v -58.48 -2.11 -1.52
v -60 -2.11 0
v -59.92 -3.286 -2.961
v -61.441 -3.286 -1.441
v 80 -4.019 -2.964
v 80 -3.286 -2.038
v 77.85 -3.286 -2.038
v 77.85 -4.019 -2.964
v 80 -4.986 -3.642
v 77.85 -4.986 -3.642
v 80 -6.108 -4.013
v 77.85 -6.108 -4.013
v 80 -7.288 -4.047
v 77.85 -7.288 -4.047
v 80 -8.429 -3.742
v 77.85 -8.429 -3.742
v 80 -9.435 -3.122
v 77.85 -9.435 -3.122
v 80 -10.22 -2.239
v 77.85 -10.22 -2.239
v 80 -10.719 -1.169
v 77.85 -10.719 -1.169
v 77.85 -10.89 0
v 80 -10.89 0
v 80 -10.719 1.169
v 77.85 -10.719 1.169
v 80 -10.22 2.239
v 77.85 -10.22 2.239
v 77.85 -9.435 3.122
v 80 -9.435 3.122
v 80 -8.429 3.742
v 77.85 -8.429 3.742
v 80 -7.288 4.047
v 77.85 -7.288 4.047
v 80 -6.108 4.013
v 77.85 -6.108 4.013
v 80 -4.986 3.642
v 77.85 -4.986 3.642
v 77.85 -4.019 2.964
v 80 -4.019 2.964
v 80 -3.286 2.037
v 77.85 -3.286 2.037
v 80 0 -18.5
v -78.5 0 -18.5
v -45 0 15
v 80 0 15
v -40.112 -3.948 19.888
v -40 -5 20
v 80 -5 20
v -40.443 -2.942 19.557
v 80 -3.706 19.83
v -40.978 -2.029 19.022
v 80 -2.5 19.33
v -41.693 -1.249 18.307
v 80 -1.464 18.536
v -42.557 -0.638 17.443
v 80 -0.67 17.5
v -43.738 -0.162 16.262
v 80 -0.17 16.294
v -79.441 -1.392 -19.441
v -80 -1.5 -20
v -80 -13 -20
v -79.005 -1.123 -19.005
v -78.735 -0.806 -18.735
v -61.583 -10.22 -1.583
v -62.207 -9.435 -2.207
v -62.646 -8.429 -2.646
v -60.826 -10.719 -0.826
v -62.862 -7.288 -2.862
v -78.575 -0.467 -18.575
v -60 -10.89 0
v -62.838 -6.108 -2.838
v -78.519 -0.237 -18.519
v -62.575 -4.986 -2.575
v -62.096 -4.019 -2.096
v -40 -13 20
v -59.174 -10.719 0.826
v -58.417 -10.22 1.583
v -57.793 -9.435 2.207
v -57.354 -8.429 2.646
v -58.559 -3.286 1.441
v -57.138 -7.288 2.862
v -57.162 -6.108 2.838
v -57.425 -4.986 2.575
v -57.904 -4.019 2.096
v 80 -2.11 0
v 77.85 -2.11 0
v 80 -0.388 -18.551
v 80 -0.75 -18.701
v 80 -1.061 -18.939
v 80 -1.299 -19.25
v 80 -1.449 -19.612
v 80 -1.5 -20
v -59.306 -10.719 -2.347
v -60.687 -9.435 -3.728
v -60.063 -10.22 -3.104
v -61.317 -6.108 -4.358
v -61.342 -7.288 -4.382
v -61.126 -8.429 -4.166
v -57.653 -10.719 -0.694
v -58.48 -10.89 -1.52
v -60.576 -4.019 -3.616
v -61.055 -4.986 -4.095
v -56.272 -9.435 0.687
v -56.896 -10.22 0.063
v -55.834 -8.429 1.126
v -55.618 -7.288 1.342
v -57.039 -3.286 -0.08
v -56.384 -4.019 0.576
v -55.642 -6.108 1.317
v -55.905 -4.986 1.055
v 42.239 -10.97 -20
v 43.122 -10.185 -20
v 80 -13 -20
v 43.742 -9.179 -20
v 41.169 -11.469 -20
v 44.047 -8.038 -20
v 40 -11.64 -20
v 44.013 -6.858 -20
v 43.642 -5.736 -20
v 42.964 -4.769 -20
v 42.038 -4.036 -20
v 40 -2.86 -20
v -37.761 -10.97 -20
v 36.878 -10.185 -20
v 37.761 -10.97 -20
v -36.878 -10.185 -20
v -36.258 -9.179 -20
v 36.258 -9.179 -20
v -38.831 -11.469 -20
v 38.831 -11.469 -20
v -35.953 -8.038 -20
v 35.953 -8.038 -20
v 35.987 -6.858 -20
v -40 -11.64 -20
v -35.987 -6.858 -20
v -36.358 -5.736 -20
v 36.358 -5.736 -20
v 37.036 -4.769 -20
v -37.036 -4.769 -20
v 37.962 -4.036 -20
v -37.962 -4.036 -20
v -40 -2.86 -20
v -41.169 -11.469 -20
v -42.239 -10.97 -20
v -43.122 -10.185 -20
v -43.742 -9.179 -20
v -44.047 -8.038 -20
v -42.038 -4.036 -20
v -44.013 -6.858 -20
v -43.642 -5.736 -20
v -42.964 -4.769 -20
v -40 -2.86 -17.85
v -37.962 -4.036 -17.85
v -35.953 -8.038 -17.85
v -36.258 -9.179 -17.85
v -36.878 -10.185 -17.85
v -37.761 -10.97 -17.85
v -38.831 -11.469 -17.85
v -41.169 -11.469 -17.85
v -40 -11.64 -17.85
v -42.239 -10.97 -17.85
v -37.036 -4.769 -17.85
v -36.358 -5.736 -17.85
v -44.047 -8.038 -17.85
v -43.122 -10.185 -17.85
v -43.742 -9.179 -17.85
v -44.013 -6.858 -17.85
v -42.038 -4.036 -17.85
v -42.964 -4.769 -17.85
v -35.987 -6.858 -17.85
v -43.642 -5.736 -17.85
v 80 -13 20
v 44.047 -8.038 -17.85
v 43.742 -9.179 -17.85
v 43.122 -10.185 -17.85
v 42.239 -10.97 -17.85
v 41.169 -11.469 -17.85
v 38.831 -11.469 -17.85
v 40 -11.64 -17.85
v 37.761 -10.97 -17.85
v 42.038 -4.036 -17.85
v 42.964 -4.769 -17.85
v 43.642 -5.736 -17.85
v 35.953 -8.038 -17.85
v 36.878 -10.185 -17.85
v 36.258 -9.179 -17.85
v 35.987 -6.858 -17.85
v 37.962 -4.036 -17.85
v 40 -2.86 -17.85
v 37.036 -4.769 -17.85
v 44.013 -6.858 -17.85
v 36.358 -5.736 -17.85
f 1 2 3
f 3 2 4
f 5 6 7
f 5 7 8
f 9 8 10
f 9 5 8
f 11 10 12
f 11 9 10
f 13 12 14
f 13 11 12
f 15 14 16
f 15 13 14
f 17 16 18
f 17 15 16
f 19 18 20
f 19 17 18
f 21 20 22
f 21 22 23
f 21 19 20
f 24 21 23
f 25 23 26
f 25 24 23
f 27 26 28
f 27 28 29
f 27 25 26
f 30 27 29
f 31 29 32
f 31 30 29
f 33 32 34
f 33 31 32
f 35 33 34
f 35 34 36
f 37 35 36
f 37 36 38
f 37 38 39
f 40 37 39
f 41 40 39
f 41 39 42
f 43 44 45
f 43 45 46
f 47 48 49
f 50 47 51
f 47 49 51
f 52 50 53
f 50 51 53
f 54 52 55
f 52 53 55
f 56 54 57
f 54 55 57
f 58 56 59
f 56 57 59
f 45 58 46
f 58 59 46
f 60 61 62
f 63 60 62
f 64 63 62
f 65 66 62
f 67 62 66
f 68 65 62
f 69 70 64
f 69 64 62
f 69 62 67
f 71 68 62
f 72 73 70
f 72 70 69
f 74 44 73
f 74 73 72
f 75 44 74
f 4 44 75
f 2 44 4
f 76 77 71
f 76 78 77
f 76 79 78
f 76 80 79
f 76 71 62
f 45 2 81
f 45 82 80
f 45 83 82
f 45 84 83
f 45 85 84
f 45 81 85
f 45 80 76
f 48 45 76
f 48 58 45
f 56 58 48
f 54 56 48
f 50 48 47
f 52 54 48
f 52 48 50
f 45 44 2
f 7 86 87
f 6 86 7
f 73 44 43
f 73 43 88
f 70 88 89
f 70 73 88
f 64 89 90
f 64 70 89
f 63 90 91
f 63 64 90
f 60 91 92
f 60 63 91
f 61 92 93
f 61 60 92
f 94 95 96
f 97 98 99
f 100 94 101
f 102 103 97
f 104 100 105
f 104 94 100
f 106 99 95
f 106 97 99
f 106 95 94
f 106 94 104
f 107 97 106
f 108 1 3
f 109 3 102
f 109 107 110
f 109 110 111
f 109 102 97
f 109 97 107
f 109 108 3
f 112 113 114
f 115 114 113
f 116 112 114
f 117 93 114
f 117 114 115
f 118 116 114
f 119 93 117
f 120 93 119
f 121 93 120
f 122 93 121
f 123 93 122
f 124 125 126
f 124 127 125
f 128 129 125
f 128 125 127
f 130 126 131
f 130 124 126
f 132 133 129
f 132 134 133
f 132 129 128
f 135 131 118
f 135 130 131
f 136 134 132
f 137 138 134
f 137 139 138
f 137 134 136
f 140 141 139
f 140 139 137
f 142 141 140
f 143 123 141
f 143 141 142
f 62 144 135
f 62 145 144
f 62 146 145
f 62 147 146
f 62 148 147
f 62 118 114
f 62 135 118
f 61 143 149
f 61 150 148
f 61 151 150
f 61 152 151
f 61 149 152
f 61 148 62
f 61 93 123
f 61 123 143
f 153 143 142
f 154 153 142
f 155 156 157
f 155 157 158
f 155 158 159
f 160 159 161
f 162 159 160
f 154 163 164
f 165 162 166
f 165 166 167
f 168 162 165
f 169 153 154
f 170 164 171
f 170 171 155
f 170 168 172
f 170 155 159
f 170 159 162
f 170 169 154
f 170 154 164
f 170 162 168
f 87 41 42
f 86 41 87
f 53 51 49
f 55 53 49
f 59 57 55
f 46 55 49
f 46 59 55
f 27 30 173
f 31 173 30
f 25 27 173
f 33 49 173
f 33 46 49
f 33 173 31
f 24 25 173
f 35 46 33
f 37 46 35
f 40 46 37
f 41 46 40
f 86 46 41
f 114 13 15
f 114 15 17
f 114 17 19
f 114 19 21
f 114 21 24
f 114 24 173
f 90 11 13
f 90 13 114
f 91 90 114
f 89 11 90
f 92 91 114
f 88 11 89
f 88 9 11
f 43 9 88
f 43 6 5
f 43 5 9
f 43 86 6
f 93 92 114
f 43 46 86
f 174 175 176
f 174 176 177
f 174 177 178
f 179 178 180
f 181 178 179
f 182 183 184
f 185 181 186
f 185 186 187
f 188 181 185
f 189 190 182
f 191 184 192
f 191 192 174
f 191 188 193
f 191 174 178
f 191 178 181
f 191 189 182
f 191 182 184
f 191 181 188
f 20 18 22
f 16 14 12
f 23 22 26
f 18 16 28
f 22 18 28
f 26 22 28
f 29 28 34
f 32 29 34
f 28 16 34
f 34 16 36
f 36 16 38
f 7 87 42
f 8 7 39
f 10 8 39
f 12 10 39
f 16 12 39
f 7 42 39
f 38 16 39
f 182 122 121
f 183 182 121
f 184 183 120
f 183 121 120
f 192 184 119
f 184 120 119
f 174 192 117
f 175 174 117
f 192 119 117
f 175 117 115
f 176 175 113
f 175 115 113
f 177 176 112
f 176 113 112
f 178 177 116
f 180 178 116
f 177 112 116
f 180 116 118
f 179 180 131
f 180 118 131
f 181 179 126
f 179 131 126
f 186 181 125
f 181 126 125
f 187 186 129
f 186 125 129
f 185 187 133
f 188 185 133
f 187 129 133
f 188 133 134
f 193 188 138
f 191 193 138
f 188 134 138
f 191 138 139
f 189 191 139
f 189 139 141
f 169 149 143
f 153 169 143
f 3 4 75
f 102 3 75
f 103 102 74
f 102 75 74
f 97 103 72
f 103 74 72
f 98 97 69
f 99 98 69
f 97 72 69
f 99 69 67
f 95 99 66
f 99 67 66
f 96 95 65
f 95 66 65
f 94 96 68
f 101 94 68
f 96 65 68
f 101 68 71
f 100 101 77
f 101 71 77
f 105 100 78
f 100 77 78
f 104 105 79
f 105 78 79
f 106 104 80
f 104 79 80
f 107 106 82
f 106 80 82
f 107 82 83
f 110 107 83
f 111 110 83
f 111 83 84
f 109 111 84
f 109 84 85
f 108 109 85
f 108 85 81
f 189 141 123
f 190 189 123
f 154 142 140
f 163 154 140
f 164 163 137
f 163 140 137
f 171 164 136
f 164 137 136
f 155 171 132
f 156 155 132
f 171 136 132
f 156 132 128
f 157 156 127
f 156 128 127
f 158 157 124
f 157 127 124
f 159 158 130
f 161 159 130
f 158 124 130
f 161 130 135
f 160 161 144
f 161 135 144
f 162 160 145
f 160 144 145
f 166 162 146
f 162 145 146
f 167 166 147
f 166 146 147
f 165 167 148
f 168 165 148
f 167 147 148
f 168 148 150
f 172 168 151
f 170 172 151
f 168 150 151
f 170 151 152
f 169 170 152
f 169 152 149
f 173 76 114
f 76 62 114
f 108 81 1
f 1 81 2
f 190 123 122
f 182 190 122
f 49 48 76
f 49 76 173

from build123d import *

# Parameters (mm, degrees)
EXTRUDE_1_DEPTH     = 13
SWEEP_START         = -80
SWEEP_1_DEPTH       = 160
SKETCH_6_R          = 4.075
CUT_EXTRUDE_1_DEPTH = 2.15
FILLET_1_R          = 5
SKETCH_7_R          = 4.075
CUT_EXTRUDE_2_DEPTH = 2.15
SKETCH_8_R          = 4.075
CUT_EXTRUDE_3_DEPTH = 2.15


# Read off the part's stored shape, not the designer's step: Вырез-По траектории1
with BuildPart() as part:
    # Эскиз1 → Бобышка-Вытянуть1 (new body)
    with BuildSketch(Plane(origin=(0, 0, 0), x_dir=(1, 0, 0), z_dir=(0, 1, 0))):
        Polygon((-40, -20), (80, -20), (80, 20), (-80, 20), align=None)
    extrude(amount=-EXTRUDE_1_DEPTH)

    # Вырез-По траектории1 outline → Вырез-По траектории1 (cut)
    with BuildSketch(Plane.YZ.offset(SWEEP_START)):
        with BuildLine():
            ThreePointArc((0, -18.5), (-1.060660172, -18.939339828), (-1.5, -20))
            Line((-1.5, -20), (0, -20))
            Line((0, -20), (0, -18.5))
        make_face()
    extrude(amount=SWEEP_1_DEPTH, mode=Mode.SUBTRACT)

    # Эскиз6 → Вырез-Вытянуть1 (cut)
    with BuildSketch(Plane(origin=(0, 0, -20), x_dir=(-1, 0, 0), z_dir=(0, 0, -1))):
        with Locations((-40, -7.565202347)):
            Circle(SKETCH_6_R)
        with BuildLine():
            Line((-40, -2.859797653), (-42.0375, -4.036148827))
            ThreePointArc((-42.0375, -4.036148827), (-40, -3.490202347), (-37.9625, -4.036148827))
            Line((-37.9625, -4.036148827), (-40, -2.859797653))
        make_face()
        with Locations((40, -7.565202347)):
            Circle(SKETCH_6_R)
        with BuildLine():
            ThreePointArc((37.9625, -4.036148827), (40, -3.490202347), (42.0375, -4.036148827))
            Line((42.0375, -4.036148827), (40, -2.859797653))
            Line((40, -2.859797653), (37.9625, -4.036148827))
        make_face()
    extrude(amount=-CUT_EXTRUDE_1_DEPTH, mode=Mode.SUBTRACT)

    # Скругление1
    fillet_1_edges = [part.edges().sort_by_distance(p)[0] for p in [
        (20, 0, 20),
    ]]
    fillet(fillet_1_edges, radius=FILLET_1_R)

    # Эскиз7 → Вырез-Вытянуть2 (cut)
    with BuildSketch(Plane.ZY.offset(-80)):
        with Locations((0, -6.815202347)):
            Circle(SKETCH_7_R)
        with BuildLine():
            Line((2.0375, -3.286148827), (0, -2.109797653))
            Line((0, -2.109797653), (-2.0375, -3.286148827))
            ThreePointArc((-2.0375, -3.286148827), (0, -2.740202347), (2.0375, -3.286148827))
        make_face()
    extrude(amount=CUT_EXTRUDE_2_DEPTH, mode=Mode.SUBTRACT)

    # Эскиз8 → Вырез-Вытянуть3 (cut)
    with BuildSketch(Plane(origin=(-30, 0, 30), x_dir=(0.7071067811865515, 0, 0.7071067811865436), z_dir=(-0.7071067811865436, 0, 0.7071067811865515))):
        with Locations((-42.426406871, -6.815202347)):
            Circle(SKETCH_8_R)
        with BuildLine():
            Line((-42.426406871, -2.109797653), (-44.463906871, -3.286148827))
            ThreePointArc((-44.463906871, -3.286148827), (-42.426406871, -2.740202347), (-40.388906871, -3.286148827))
            Line((-40.388906871, -3.286148827), (-42.426406871, -2.109797653))
        make_face()
    extrude(amount=-CUT_EXTRUDE_3_DEPTH, mode=Mode.SUBTRACT)


solid = part.part
